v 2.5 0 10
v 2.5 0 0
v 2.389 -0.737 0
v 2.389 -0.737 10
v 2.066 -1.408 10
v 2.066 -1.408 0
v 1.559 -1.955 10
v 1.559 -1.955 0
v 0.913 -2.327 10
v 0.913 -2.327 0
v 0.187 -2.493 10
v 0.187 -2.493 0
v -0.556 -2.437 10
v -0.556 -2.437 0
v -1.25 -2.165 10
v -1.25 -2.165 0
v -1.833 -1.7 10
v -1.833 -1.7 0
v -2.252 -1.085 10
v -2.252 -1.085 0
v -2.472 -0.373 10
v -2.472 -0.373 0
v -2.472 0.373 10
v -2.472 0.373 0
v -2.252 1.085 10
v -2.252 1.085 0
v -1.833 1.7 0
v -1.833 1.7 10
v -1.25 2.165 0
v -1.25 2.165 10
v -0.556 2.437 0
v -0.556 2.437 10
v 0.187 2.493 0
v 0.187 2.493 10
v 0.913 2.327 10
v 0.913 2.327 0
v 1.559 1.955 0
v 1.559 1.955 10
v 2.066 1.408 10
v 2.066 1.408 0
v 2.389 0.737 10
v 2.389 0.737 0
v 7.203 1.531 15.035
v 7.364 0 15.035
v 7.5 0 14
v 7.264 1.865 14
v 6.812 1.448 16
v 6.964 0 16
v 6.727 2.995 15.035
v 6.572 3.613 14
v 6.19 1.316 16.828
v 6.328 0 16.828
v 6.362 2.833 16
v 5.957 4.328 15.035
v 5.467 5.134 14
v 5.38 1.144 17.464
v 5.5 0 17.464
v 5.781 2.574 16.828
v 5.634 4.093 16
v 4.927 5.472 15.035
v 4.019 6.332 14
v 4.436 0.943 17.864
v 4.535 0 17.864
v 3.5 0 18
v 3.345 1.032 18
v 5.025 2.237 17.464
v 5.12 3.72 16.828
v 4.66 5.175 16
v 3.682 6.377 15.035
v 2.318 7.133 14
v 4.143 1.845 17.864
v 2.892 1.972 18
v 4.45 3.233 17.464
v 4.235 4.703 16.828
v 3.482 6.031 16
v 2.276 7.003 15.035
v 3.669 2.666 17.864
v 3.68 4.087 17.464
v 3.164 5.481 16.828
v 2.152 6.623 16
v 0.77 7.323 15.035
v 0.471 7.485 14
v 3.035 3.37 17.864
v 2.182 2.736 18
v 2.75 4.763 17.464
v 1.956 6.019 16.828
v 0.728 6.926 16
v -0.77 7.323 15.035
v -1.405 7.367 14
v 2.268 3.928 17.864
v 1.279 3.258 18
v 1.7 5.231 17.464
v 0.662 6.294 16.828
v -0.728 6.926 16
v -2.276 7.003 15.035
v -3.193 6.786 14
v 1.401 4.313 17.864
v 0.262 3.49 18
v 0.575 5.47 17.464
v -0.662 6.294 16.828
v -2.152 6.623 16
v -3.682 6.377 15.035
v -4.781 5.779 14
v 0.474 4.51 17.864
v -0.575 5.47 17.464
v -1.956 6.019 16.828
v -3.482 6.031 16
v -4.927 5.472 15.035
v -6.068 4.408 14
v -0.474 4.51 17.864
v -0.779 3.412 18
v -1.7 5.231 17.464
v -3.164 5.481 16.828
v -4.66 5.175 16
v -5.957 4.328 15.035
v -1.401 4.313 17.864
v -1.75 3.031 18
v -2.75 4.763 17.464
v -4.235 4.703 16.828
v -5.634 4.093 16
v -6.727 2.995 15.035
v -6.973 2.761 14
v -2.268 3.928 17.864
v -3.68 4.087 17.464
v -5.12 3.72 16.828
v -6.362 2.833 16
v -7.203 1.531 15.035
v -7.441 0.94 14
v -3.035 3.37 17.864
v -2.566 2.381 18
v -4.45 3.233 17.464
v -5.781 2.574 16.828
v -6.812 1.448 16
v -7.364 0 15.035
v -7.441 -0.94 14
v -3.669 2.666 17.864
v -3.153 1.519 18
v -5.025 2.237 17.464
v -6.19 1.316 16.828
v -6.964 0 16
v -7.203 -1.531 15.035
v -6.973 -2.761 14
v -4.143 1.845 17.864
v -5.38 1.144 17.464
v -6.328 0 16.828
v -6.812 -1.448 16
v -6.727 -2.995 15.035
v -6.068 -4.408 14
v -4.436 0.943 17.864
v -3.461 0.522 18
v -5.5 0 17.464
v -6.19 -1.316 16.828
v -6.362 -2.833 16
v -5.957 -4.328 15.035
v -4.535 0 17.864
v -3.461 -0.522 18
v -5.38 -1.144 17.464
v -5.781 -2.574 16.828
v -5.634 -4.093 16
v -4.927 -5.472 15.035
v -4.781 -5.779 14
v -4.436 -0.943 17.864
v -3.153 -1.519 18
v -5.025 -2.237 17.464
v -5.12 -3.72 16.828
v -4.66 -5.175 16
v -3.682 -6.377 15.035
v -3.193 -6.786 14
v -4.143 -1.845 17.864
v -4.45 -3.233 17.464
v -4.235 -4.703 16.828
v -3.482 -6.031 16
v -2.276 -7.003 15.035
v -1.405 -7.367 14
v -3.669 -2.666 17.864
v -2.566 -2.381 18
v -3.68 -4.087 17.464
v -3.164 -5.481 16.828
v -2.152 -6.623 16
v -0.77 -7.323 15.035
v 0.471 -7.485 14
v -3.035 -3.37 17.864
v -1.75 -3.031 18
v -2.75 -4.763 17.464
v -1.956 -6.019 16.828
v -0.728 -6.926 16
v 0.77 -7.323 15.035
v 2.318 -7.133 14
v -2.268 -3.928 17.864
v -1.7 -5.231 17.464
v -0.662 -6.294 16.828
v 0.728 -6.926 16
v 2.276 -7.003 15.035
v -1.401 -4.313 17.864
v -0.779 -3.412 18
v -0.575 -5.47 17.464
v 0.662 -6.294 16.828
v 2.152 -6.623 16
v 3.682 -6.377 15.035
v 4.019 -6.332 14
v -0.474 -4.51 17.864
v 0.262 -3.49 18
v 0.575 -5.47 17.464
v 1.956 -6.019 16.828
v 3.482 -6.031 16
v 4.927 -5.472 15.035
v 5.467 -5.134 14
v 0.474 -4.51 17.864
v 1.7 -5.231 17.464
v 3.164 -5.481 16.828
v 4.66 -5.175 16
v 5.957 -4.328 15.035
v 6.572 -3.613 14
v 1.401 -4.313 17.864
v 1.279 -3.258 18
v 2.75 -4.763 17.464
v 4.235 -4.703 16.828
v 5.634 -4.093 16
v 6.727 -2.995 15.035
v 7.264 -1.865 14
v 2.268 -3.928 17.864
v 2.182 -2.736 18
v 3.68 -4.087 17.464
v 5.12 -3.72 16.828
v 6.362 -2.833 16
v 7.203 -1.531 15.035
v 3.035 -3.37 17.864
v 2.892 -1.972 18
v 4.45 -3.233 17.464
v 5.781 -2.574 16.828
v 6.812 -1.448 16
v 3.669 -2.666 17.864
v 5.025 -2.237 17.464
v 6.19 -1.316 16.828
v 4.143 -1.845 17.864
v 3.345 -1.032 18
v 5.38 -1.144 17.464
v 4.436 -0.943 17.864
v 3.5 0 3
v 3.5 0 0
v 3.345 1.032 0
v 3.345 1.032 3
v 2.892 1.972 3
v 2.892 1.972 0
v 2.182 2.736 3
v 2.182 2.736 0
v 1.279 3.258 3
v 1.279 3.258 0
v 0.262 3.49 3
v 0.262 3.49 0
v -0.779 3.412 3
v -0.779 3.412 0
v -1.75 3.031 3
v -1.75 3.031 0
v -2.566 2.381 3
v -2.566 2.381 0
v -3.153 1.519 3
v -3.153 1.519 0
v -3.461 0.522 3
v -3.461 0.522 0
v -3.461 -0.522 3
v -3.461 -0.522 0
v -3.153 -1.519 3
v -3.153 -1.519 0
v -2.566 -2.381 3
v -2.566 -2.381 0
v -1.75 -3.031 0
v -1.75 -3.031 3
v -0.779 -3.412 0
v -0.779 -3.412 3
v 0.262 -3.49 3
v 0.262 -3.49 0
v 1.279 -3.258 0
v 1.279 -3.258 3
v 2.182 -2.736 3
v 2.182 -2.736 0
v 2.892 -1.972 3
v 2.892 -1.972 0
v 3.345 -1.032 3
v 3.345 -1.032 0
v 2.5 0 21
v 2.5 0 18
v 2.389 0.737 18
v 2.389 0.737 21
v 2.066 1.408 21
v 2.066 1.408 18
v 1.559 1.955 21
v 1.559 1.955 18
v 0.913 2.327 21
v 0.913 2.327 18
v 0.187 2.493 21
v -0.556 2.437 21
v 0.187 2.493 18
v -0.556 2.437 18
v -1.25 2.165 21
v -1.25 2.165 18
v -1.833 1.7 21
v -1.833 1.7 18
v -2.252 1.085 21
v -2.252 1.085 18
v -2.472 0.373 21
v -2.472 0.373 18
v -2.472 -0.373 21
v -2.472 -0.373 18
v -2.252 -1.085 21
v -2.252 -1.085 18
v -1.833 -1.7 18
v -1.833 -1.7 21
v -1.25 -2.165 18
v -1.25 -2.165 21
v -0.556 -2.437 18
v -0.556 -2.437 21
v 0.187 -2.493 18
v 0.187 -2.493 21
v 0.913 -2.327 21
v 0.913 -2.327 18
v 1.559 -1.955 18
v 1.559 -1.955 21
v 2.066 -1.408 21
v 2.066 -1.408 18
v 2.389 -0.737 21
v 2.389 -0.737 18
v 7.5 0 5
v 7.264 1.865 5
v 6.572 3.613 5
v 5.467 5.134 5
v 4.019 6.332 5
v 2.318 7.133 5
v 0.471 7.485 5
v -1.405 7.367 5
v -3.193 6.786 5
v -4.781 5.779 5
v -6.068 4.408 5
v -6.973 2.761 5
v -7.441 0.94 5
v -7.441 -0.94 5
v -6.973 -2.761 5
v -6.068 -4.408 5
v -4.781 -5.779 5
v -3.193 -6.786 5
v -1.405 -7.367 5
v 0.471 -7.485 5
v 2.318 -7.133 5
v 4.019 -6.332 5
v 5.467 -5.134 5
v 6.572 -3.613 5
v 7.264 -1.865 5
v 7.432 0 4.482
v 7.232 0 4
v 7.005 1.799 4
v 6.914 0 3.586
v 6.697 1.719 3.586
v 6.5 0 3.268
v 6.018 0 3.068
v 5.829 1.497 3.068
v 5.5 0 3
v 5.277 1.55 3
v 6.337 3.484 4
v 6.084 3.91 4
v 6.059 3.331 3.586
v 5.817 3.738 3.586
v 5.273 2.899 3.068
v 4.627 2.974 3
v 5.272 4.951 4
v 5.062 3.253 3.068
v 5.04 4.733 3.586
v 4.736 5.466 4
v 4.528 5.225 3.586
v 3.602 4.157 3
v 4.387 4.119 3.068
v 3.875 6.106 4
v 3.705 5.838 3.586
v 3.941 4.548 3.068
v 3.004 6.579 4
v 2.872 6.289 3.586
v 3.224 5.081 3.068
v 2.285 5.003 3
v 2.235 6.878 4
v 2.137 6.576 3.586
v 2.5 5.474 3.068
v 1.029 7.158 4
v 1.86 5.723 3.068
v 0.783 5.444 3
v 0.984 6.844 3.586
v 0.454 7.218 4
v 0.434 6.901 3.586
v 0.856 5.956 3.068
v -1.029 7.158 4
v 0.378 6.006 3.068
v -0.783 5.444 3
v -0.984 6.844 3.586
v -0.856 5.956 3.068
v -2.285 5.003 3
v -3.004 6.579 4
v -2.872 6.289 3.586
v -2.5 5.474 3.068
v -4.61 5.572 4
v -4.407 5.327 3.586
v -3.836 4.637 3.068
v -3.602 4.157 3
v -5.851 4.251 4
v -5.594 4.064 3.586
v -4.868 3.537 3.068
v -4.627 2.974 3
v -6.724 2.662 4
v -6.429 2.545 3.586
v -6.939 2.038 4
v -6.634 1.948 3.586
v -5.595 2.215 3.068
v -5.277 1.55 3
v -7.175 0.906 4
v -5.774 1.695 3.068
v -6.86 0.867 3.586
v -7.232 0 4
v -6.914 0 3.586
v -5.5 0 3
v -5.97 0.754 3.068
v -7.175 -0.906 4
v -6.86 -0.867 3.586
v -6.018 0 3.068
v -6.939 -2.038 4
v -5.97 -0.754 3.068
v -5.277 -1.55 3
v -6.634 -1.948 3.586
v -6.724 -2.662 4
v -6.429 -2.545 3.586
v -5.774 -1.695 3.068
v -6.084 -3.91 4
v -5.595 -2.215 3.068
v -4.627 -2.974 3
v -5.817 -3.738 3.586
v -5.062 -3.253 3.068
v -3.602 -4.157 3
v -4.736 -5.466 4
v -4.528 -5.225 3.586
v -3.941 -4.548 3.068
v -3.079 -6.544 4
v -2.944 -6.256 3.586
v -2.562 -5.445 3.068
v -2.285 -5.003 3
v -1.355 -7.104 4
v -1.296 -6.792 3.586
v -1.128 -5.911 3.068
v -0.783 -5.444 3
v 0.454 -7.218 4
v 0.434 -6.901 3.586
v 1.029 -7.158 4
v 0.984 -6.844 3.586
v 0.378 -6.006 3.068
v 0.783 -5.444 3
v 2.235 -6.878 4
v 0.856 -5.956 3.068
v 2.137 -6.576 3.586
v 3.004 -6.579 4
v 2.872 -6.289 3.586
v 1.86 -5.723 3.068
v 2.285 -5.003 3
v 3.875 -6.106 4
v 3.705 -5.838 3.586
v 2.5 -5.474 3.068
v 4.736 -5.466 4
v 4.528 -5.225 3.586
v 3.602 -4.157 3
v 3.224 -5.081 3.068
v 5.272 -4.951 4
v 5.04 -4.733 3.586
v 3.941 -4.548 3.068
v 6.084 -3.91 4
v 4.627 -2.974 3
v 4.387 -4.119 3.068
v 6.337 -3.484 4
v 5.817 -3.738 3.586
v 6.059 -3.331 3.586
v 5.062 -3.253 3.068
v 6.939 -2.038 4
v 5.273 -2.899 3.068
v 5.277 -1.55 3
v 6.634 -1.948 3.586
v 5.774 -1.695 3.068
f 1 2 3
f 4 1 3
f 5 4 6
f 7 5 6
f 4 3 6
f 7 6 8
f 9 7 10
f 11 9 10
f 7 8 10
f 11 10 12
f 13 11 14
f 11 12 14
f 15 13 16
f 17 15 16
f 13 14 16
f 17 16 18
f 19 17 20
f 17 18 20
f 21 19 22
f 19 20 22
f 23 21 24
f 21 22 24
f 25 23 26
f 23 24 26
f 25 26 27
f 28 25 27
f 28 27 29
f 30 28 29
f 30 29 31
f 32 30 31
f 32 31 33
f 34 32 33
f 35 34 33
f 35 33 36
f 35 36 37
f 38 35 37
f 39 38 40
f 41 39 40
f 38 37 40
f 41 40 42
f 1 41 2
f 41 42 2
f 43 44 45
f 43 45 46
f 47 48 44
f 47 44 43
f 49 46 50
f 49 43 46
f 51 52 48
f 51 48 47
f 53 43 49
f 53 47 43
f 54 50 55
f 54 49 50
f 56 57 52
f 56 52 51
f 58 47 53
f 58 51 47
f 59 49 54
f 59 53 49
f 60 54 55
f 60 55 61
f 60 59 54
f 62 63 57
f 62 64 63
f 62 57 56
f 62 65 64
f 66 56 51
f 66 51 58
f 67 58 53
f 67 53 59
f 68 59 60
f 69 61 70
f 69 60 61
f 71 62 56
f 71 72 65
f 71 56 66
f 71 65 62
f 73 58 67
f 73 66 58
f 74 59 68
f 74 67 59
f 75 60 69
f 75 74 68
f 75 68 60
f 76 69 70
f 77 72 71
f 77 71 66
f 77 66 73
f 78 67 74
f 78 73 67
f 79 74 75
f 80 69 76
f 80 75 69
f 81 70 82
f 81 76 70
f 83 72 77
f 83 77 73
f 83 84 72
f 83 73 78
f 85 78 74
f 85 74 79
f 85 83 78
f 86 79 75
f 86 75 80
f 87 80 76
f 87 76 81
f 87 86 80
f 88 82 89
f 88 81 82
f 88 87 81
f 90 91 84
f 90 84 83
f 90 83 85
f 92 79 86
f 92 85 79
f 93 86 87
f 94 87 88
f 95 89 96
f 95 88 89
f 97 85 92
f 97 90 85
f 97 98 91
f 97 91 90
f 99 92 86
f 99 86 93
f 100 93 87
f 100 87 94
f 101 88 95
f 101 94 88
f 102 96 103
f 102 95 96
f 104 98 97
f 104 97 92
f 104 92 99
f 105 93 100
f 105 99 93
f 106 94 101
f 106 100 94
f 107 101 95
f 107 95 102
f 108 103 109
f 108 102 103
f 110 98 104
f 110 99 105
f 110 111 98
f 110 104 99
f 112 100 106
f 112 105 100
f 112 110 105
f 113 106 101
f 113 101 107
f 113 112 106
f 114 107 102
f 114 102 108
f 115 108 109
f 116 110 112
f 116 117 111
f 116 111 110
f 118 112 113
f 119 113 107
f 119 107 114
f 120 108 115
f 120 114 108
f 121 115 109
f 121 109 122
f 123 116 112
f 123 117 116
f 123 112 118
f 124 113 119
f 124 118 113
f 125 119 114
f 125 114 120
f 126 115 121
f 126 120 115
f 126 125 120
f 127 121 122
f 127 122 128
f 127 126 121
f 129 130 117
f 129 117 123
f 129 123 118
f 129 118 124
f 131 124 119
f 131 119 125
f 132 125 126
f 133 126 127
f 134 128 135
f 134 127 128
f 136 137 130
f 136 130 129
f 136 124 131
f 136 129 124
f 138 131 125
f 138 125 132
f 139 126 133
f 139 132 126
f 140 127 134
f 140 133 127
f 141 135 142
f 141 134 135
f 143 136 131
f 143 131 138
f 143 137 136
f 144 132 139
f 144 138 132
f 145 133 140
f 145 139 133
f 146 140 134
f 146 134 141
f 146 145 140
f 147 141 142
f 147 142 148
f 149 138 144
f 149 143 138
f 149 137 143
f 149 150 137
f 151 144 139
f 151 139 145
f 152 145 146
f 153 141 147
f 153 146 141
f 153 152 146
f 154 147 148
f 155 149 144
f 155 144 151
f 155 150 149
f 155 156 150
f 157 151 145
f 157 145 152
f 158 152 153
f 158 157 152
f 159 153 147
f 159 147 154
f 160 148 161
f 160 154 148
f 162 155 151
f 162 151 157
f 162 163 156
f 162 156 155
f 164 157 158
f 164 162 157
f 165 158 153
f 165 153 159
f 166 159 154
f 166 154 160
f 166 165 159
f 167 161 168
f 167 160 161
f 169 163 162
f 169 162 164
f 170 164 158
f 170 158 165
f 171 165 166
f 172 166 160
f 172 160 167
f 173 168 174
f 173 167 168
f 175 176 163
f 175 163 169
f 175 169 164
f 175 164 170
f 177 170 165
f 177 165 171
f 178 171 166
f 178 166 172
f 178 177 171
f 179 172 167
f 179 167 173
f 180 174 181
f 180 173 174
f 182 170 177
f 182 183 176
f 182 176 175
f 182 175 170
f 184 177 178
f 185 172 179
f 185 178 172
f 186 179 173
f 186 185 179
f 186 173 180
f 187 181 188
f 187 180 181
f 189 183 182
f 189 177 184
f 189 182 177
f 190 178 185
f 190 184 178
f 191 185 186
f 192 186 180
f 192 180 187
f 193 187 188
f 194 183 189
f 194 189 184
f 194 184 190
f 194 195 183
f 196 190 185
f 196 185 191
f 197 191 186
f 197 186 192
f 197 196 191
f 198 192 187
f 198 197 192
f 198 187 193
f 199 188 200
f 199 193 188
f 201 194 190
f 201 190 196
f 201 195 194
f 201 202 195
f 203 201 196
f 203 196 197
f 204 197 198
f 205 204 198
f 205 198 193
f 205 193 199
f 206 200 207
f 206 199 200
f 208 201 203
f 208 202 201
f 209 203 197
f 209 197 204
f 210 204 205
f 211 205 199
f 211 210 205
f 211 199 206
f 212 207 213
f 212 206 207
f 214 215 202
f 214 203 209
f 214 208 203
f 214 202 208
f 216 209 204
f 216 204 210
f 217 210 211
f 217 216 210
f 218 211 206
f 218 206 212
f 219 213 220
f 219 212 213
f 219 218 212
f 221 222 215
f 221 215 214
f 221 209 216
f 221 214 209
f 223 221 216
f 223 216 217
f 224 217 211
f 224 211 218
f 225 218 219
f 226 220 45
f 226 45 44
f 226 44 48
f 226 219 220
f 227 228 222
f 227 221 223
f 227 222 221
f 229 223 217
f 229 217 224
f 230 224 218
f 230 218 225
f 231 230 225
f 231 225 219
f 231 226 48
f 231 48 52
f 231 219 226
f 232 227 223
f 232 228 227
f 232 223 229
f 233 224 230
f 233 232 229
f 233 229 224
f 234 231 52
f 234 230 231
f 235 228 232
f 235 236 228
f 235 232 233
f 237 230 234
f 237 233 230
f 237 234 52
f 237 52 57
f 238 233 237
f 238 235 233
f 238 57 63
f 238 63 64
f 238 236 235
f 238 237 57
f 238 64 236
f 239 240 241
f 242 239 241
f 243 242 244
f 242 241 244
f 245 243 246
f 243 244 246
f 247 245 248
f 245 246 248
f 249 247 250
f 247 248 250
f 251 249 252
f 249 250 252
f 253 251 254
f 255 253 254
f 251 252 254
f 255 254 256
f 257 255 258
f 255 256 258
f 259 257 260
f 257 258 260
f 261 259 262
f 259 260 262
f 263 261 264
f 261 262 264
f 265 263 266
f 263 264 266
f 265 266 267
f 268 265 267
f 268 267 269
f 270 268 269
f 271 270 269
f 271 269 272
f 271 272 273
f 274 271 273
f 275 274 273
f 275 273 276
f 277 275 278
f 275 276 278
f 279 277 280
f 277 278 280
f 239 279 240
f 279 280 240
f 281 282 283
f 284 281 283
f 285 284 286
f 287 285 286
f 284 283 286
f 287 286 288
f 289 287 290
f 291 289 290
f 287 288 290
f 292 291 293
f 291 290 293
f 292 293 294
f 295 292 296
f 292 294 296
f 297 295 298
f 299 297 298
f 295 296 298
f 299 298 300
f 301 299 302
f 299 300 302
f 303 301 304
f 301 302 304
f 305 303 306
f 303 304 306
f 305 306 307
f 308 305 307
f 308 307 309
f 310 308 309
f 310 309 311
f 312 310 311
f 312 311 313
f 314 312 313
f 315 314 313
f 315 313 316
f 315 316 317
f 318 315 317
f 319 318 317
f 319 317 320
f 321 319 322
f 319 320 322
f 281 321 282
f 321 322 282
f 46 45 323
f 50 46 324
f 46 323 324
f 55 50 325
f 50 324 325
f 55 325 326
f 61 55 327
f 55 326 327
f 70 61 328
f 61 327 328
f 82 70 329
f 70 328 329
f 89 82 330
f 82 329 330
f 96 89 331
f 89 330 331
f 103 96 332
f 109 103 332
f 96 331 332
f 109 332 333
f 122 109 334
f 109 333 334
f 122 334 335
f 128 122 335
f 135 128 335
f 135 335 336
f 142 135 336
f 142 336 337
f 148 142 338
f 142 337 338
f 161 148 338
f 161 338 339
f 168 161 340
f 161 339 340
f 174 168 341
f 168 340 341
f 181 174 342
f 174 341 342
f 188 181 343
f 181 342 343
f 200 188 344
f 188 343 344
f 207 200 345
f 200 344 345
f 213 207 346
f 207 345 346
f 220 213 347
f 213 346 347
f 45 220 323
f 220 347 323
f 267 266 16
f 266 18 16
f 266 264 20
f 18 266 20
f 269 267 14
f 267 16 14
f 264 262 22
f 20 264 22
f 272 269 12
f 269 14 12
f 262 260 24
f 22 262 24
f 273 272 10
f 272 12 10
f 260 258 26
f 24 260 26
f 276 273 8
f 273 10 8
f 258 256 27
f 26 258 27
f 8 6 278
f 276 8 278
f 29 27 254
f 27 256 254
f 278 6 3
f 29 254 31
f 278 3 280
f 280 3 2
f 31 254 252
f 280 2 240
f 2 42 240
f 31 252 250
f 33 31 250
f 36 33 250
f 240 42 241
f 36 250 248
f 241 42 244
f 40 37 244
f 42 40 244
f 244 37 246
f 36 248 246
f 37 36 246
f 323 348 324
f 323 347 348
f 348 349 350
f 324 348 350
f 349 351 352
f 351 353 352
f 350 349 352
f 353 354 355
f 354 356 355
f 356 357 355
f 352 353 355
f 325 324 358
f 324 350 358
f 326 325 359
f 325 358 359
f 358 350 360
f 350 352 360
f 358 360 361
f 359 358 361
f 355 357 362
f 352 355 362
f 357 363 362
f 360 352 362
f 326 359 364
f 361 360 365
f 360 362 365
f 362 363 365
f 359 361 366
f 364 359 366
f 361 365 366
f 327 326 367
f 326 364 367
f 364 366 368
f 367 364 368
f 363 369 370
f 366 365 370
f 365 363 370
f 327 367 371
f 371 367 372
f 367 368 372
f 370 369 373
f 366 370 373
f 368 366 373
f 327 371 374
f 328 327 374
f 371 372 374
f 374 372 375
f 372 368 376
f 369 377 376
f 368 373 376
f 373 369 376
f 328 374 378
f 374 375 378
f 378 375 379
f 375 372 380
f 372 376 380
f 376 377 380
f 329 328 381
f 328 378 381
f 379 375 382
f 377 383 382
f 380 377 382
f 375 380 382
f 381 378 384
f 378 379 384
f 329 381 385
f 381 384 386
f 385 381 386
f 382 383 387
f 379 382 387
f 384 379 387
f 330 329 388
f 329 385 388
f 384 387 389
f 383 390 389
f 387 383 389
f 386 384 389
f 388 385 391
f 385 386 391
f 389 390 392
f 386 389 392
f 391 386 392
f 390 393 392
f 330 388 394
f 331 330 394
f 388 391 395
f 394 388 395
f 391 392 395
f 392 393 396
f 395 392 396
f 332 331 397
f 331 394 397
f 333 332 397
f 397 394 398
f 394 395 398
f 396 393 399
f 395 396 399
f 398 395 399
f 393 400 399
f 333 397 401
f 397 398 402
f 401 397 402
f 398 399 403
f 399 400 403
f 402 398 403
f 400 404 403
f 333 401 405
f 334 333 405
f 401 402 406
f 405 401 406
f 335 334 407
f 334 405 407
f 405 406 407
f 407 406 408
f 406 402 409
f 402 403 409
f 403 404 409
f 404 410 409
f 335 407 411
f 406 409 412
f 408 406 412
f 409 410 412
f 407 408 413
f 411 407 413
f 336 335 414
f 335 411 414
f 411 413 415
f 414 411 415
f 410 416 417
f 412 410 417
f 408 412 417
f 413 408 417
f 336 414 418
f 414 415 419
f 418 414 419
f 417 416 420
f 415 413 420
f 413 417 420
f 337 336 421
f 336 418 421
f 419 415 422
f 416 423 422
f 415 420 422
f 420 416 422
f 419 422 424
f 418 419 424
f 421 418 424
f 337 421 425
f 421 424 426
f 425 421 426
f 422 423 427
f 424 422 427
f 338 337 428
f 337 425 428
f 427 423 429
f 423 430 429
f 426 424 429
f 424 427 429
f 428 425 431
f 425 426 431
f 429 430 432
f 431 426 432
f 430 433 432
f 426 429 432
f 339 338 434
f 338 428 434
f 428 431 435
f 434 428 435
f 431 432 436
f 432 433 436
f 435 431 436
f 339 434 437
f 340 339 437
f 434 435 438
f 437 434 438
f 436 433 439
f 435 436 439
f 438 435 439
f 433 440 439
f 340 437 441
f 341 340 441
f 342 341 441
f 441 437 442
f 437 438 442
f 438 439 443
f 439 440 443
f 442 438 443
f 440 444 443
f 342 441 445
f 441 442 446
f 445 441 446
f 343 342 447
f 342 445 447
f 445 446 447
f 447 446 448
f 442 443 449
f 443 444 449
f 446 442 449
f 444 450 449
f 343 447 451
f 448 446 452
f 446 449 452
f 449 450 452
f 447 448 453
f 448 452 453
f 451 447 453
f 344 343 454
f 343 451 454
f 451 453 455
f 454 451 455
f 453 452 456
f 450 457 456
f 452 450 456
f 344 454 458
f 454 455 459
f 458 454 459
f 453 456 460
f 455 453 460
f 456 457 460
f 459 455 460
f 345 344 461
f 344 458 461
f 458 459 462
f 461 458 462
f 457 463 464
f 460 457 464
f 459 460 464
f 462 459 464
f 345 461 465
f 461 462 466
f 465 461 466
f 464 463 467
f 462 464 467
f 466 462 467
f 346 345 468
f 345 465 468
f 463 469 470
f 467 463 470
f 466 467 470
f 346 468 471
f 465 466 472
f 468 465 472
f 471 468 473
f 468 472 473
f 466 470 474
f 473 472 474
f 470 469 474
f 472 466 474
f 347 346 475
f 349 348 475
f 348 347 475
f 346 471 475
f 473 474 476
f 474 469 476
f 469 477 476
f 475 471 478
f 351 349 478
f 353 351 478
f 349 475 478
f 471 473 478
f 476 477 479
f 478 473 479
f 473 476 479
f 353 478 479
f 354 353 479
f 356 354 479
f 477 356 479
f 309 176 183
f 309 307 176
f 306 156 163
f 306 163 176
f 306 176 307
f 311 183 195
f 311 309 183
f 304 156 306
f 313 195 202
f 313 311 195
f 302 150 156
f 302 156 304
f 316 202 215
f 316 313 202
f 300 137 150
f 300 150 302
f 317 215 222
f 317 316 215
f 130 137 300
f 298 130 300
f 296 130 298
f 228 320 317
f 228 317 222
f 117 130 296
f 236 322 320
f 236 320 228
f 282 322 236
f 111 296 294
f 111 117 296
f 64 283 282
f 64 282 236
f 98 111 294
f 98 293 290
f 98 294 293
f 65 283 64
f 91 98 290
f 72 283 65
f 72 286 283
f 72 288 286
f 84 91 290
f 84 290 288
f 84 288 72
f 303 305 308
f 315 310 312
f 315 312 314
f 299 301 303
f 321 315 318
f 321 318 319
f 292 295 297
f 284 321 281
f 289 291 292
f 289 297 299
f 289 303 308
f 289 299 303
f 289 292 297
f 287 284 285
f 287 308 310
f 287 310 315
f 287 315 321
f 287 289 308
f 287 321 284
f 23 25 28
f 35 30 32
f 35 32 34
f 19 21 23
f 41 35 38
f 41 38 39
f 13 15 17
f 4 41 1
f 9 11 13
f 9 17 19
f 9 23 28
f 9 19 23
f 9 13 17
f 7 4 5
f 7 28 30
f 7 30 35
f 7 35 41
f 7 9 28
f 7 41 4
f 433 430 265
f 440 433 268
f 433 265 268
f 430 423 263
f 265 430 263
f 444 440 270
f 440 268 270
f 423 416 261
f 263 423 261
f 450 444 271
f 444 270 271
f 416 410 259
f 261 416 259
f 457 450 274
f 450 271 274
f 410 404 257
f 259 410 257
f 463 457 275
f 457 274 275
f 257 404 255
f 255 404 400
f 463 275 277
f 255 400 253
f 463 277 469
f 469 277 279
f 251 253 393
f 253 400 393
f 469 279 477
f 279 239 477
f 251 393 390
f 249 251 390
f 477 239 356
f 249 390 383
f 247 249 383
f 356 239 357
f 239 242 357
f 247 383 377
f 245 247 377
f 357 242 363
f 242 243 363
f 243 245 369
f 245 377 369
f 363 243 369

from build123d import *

# Parameters (mm, degrees)
F0_R     = 3.5
F1_DEPTH = 3
F2_R     = 7.5
F2_R_2   = 3.5
F3_DEPTH = 15
F4_R     = 2.5
F5_DEPTH = 3
F6_R     = 2.5
F7_DEPTH = 10
F8_R     = 4
F9_R     = 2


with BuildPart() as f1:
    # F0 (on Top) → F1 (new body)
    with BuildSketch(Plane.XY):
        Circle(F0_R)
    extrude(amount=F1_DEPTH)

    # F2 (on face) → F3 (join)
    with BuildSketch(Plane.XY.offset(3)):
        Circle(F2_R)
        Circle(F2_R_2, mode=Mode.SUBTRACT)
        Circle(F2_R_2)
    extrude(amount=F3_DEPTH)

    # F4 (on face) → F5 (join)
    with BuildSketch(Plane.XY.offset(18)):
        Circle(F4_R)
    extrude(amount=F5_DEPTH)

    # F6 (on face) → F7 (cut)
    with BuildSketch(Plane(origin=(0, 0, 0), x_dir=(1, 0, 0), z_dir=(0, 0, -1))):
        Circle(F6_R)
    extrude(amount=-F7_DEPTH, mode=Mode.SUBTRACT)

    # F8
    f8_edges = [f1.edges().sort_by_distance(p)[0] for p in [
        (-7.5, 0, 18),
    ]]
    fillet(f8_edges, radius=F8_R)

    # F9
    f9_edges = [f1.edges().sort_by_distance(p)[0] for p in [
        (-7.5, 0, 3),
    ]]
    fillet(f9_edges, radius=F9_R)


solid = f1.part
